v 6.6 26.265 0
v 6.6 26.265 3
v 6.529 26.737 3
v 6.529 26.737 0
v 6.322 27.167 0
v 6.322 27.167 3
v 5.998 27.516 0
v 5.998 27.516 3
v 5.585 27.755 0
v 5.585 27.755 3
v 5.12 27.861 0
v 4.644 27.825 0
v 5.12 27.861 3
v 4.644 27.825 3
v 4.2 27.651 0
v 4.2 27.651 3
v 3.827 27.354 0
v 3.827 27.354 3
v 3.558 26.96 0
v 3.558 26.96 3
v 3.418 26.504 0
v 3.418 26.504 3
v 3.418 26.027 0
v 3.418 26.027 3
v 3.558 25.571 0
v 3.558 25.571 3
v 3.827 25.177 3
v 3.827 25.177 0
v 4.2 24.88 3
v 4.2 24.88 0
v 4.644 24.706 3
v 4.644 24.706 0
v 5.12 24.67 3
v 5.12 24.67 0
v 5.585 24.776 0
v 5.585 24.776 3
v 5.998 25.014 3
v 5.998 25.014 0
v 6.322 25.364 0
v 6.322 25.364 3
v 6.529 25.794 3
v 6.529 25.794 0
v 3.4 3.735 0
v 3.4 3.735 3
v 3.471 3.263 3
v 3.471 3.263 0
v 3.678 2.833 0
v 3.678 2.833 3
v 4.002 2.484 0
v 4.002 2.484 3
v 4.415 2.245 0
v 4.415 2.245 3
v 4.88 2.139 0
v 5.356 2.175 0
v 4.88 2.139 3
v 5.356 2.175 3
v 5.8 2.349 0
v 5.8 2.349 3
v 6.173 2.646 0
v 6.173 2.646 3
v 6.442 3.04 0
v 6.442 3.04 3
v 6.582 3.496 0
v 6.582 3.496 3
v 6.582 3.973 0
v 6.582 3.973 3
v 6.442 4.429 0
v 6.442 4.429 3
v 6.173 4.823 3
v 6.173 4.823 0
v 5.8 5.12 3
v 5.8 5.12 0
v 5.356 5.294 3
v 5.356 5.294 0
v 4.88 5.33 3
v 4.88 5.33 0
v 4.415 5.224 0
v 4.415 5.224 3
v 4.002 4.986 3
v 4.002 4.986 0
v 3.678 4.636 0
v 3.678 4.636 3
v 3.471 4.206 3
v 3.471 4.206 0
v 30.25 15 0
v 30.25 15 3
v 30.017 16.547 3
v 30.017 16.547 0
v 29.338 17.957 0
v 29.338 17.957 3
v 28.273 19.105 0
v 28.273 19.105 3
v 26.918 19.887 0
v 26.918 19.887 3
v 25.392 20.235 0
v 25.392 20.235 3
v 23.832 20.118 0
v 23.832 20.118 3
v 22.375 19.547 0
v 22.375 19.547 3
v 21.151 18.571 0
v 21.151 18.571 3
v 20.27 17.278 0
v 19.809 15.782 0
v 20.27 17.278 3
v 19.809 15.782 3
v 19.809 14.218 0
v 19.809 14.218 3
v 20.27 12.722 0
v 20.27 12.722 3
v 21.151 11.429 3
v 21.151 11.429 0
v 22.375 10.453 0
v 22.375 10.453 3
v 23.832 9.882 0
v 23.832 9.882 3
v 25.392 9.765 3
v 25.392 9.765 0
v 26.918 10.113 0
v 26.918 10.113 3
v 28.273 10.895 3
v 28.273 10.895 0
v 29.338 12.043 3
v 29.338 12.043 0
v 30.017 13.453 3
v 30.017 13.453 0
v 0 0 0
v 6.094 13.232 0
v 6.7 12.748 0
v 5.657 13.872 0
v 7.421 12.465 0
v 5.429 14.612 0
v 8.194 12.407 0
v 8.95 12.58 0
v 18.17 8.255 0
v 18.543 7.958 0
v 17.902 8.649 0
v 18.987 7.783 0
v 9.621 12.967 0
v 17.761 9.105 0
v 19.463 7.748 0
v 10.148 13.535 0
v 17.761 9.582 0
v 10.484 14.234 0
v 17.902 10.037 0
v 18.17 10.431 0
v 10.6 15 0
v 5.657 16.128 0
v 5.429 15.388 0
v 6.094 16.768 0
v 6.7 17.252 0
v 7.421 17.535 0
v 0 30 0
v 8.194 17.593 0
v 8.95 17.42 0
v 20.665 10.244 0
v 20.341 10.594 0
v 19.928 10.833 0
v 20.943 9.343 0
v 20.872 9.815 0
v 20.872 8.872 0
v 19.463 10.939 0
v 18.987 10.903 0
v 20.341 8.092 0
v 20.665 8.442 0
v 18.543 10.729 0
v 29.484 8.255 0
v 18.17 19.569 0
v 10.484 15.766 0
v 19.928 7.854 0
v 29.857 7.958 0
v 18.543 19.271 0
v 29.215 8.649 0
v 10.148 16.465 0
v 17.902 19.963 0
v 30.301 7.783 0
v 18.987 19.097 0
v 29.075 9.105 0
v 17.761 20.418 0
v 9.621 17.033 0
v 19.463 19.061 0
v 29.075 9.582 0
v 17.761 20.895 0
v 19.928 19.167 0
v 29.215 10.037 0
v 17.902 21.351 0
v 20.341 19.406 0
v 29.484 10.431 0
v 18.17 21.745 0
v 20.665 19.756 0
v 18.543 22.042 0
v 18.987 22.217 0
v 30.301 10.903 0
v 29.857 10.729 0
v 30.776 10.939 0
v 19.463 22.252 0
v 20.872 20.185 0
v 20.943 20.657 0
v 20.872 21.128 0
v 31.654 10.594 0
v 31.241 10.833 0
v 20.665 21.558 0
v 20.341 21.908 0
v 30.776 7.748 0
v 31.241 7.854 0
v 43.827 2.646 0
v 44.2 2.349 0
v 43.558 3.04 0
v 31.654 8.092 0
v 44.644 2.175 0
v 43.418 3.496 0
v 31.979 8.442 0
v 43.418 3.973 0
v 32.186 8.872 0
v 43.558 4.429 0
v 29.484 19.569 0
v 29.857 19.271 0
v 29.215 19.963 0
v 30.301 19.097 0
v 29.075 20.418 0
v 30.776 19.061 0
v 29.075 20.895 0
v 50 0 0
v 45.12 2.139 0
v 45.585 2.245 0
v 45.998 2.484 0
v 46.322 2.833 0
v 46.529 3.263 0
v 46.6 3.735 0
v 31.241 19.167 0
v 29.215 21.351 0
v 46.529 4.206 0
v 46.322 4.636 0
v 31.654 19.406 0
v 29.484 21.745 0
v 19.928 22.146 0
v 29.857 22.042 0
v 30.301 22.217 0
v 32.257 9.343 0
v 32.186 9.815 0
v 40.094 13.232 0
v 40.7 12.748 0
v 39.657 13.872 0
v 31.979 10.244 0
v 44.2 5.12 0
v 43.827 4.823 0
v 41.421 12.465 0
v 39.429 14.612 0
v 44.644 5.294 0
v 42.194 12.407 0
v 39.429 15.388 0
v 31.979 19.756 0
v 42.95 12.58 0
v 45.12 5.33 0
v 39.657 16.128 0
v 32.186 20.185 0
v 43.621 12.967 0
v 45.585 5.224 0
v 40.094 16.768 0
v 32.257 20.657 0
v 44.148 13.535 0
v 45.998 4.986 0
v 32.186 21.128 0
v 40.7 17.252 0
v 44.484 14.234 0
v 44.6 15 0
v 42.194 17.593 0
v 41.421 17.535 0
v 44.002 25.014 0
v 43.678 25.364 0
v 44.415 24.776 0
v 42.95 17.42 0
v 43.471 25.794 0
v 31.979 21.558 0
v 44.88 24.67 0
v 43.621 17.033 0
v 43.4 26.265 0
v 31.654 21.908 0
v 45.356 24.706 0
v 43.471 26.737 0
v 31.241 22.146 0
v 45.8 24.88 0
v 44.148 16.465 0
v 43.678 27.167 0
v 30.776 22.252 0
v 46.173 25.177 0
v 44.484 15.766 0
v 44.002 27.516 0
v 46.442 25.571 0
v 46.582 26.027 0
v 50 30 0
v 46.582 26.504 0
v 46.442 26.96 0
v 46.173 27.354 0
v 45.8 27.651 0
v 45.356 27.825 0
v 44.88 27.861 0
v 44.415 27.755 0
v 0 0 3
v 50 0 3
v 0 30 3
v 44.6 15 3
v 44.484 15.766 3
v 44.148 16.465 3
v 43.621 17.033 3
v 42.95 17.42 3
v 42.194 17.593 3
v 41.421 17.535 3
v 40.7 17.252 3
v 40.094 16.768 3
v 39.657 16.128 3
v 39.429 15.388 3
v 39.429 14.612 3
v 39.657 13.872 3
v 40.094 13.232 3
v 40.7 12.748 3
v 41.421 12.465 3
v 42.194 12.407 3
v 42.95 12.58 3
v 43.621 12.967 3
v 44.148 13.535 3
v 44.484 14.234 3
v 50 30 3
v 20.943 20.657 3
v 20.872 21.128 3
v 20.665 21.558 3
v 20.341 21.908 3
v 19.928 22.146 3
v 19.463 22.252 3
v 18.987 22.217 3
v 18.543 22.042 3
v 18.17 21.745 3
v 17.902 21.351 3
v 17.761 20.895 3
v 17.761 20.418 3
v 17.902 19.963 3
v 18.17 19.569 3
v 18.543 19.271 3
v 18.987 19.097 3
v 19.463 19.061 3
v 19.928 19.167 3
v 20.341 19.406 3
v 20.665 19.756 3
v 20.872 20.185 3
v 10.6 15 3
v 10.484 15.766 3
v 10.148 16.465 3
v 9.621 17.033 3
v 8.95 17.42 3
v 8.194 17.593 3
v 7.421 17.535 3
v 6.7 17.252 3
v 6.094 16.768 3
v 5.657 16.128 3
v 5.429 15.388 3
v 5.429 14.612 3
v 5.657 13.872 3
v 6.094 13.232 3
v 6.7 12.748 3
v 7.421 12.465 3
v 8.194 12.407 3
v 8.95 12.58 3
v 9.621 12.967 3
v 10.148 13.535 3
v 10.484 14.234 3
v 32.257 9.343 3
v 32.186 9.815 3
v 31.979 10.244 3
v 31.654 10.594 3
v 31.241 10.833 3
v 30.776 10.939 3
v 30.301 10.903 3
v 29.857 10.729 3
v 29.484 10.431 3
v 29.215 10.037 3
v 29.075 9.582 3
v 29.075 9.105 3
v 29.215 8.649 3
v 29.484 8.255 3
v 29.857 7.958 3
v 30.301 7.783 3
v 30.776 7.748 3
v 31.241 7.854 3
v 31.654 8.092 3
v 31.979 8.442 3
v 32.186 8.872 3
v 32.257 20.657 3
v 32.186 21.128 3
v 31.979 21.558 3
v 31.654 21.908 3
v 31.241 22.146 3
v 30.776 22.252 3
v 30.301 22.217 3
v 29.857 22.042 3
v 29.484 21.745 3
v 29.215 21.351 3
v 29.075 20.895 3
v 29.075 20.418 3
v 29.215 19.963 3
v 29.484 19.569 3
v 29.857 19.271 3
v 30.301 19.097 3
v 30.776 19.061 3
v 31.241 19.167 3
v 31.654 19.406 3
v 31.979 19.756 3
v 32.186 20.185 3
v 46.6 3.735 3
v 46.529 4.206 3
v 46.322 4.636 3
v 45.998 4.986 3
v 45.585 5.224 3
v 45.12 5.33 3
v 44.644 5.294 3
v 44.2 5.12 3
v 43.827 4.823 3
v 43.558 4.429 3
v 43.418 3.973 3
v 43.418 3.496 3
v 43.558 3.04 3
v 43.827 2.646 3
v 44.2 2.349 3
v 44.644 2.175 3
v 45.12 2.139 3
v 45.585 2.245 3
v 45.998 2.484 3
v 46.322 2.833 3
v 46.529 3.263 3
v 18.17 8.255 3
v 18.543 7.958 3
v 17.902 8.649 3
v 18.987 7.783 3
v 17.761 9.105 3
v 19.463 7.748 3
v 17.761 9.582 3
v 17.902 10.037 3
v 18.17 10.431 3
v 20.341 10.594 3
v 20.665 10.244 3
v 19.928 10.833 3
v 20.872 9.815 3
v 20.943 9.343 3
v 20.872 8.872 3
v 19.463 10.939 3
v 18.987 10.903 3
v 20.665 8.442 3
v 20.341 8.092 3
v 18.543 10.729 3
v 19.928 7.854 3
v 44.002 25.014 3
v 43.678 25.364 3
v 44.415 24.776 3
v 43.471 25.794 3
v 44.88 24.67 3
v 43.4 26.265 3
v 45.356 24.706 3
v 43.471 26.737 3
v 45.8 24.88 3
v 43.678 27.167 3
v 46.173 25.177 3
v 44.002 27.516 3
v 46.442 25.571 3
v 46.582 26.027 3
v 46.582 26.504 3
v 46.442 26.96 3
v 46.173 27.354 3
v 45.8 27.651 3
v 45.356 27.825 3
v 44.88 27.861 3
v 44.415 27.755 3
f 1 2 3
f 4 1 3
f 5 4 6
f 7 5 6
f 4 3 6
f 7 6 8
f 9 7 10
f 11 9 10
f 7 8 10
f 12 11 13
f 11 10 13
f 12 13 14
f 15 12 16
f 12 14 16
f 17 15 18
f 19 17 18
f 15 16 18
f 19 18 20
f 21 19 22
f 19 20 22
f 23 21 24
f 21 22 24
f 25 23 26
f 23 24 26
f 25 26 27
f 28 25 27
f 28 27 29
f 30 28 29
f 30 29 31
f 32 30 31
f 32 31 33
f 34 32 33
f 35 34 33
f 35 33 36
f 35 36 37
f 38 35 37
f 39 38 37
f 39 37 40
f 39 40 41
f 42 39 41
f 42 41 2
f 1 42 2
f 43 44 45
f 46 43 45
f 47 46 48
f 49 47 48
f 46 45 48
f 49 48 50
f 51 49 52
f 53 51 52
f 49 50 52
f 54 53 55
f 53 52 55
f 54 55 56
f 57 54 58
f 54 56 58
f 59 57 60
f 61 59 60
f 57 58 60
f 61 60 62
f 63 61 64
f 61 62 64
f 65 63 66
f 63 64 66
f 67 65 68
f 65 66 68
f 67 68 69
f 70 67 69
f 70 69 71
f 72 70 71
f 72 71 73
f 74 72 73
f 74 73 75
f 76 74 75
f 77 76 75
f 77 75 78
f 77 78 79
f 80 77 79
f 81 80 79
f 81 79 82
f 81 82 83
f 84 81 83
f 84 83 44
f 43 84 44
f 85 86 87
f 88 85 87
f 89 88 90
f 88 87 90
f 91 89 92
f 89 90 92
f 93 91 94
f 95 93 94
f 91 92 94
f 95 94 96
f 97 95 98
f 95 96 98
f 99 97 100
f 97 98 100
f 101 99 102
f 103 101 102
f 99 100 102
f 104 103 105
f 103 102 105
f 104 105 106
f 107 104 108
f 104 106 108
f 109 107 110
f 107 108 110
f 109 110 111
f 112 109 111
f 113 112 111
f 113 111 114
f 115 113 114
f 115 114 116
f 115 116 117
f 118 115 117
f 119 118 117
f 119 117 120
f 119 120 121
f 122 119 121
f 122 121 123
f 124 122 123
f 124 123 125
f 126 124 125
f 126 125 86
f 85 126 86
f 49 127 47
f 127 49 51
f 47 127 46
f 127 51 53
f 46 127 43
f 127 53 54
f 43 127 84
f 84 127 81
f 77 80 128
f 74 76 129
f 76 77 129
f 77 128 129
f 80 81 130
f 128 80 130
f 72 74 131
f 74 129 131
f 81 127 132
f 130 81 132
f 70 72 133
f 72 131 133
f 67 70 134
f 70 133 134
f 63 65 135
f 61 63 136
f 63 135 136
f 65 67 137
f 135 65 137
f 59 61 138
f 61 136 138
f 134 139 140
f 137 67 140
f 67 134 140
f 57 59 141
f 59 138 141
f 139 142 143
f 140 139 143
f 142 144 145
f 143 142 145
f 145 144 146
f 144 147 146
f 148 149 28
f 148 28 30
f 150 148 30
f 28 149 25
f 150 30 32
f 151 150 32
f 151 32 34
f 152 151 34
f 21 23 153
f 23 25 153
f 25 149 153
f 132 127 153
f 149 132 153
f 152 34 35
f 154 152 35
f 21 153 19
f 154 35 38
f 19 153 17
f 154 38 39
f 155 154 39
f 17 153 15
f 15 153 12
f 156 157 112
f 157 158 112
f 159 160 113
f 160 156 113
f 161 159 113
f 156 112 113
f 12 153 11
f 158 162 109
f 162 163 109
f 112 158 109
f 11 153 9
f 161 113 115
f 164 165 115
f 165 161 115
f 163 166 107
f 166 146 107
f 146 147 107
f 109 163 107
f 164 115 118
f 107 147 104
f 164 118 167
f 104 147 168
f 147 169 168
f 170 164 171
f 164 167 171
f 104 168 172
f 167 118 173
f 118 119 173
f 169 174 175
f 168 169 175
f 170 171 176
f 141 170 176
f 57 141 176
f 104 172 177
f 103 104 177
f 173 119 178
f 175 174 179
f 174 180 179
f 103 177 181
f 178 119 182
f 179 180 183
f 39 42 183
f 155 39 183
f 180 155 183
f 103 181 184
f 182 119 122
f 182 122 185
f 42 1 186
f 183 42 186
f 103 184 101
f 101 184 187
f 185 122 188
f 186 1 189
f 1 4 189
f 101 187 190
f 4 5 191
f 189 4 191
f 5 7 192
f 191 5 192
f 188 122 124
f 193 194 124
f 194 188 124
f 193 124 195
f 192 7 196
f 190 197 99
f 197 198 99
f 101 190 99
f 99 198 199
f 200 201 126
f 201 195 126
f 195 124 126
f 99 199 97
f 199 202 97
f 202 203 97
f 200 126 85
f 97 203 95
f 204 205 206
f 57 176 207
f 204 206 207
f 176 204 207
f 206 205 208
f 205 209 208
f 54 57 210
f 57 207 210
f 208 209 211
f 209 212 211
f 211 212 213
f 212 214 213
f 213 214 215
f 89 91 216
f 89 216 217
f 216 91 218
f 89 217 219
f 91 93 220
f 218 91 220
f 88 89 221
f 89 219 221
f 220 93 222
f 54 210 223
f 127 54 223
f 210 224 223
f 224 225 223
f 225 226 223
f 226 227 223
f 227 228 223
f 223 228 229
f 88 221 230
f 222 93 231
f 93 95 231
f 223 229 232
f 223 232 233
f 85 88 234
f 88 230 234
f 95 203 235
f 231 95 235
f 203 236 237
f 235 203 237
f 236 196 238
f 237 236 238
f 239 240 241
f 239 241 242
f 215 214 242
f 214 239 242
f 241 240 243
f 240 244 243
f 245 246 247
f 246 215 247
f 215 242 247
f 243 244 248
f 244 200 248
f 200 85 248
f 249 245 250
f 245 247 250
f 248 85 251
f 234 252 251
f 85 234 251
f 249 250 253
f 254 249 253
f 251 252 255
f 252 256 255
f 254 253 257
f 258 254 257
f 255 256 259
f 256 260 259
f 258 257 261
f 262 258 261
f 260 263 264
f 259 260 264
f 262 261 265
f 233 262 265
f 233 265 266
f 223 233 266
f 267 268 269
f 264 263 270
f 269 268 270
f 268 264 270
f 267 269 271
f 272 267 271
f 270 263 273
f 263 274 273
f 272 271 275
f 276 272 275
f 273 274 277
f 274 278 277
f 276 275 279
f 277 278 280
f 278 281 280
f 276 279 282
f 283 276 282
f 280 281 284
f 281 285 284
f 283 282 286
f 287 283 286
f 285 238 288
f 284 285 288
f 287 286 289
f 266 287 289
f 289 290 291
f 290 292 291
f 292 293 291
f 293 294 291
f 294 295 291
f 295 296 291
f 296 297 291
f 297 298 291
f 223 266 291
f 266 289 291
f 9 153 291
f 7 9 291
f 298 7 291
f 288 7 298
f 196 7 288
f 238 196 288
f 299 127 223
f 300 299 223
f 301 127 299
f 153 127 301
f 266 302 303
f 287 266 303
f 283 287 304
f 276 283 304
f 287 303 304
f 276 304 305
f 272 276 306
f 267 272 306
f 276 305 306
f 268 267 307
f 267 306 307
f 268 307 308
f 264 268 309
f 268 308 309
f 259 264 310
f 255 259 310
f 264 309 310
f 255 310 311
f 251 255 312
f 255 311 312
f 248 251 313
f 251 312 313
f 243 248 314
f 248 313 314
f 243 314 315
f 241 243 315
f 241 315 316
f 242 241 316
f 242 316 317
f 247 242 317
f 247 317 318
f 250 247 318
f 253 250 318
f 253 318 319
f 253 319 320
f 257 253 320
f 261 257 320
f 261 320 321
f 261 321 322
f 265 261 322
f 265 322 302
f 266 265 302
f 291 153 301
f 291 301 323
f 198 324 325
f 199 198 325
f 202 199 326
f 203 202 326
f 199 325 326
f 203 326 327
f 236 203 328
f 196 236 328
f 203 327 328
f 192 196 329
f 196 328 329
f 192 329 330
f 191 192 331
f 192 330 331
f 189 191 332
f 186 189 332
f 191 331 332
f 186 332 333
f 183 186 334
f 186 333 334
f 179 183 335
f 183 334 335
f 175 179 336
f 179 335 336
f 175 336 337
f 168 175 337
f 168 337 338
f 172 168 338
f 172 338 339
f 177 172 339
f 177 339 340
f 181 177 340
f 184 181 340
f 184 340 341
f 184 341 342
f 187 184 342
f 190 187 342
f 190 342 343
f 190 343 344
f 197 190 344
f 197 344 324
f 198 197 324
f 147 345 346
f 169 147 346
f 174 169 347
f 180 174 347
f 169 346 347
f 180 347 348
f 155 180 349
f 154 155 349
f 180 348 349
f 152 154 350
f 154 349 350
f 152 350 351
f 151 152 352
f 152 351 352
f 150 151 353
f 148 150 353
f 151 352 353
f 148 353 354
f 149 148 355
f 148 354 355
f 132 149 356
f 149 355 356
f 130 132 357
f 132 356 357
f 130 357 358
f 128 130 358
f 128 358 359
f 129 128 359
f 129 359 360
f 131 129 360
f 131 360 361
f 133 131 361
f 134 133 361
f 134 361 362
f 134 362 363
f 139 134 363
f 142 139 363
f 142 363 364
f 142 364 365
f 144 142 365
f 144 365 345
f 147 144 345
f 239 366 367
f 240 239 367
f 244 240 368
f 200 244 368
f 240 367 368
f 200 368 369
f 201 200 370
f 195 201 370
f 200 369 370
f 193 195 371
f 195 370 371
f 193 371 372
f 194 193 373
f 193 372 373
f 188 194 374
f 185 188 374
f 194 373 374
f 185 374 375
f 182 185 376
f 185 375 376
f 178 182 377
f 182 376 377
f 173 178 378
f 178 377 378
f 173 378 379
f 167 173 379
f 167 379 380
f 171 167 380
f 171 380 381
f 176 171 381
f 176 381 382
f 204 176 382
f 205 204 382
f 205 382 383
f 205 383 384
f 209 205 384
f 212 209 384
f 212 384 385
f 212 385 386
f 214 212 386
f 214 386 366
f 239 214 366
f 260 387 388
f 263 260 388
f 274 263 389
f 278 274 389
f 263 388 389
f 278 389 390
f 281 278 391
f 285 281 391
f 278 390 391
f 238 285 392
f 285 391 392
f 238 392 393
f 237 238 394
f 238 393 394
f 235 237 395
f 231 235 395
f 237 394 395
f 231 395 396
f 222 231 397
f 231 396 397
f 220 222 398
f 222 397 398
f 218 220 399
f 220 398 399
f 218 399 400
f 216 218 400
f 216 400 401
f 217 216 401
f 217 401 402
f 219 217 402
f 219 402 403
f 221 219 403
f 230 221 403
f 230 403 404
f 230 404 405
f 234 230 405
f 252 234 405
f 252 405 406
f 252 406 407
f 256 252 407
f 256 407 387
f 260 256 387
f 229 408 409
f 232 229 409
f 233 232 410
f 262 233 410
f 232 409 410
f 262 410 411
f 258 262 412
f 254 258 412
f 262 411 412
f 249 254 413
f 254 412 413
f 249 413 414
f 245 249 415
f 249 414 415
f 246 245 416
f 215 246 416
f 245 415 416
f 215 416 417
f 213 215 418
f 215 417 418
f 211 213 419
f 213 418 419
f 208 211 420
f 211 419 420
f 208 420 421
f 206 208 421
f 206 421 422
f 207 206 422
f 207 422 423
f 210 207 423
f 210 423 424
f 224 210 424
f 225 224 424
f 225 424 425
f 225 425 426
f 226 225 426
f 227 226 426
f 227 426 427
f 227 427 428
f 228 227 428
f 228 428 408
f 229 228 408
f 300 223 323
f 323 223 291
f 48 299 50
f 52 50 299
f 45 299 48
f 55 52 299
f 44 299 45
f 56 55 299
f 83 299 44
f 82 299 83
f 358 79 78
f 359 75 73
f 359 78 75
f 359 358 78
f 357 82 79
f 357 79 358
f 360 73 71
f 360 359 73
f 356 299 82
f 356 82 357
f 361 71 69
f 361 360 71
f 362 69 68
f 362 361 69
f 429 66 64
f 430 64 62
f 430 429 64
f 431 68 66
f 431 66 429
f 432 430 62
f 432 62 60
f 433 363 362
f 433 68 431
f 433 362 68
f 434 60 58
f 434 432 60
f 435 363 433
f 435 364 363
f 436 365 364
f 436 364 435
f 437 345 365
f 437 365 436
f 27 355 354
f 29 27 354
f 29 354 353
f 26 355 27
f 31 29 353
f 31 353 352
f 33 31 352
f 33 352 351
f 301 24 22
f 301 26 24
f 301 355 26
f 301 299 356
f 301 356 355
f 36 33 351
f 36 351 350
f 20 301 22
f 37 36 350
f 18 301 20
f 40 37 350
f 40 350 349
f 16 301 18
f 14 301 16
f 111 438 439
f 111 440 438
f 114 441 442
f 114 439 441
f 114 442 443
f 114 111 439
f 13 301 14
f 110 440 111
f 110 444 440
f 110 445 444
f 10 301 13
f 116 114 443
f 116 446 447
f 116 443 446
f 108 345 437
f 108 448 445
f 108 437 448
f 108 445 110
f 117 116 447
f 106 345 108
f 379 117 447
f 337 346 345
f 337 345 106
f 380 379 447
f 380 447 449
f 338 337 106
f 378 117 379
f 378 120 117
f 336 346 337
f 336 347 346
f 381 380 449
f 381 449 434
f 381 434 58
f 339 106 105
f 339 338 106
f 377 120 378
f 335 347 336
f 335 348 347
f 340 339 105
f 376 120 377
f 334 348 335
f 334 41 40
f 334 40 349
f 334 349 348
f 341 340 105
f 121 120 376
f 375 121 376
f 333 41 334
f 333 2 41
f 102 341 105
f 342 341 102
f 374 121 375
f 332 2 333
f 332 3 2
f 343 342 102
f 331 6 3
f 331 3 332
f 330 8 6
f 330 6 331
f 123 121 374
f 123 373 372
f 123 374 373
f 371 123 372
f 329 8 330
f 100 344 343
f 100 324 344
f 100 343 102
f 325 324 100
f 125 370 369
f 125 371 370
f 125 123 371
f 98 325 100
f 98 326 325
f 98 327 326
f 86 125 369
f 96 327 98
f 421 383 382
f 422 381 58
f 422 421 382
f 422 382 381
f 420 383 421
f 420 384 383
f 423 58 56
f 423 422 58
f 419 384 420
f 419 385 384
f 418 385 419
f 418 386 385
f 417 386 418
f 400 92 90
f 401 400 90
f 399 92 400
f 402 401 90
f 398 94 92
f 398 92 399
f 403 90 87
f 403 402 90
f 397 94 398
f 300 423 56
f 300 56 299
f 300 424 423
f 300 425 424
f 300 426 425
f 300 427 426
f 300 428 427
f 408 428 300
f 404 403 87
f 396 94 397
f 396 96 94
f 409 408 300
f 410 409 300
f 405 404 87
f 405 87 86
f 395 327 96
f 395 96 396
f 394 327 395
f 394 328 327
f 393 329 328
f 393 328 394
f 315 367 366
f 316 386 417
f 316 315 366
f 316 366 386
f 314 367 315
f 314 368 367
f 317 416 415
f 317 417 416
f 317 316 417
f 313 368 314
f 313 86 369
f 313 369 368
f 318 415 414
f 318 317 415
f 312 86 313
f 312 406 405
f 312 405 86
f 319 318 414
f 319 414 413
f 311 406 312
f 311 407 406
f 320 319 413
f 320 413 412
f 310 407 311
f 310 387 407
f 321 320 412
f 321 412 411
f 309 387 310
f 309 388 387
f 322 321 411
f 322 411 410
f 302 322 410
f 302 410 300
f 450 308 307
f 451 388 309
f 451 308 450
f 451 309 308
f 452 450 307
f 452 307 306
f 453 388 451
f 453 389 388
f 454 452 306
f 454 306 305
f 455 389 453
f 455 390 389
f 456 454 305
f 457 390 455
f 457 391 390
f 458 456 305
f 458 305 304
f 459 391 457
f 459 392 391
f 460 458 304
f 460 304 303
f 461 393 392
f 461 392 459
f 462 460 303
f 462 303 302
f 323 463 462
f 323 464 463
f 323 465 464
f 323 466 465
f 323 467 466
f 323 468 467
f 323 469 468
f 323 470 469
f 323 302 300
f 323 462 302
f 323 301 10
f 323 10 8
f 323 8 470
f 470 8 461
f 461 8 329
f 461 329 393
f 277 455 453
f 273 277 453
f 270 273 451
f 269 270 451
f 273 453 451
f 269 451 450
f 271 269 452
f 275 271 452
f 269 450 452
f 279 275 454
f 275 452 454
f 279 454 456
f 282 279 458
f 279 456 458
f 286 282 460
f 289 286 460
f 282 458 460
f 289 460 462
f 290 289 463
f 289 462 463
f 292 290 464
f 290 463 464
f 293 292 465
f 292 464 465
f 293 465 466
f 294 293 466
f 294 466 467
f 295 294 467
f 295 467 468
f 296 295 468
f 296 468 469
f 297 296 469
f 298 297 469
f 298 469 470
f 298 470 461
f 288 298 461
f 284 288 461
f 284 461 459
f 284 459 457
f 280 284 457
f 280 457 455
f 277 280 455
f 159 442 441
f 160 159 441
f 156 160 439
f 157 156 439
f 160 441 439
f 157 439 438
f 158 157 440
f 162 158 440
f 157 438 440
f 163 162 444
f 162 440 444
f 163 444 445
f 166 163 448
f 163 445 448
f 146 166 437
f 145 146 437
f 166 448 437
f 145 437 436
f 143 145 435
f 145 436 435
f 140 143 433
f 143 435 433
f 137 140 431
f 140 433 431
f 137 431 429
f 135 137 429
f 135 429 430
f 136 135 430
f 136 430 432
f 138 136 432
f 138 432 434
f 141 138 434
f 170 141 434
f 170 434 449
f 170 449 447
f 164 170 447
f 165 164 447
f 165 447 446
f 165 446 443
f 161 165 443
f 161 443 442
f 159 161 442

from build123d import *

# Parameters (mm, degrees)
SKETCH_1_W          = 50
SKETCH_1_H          = 30
EXTRUDE_1_DEPTH     = 3
SKETCH_2_R          = 2.6
SKETCH_2_R_2        = 1.6
SKETCH_2_R_3        = 5.25
CUT_EXTRUDE_1_DEPTH = 5


with BuildPart() as part:
    # 草图1 → 凸台-拉伸1 (new body)
    with BuildSketch(Plane.XY):
        with Locations((25, 15)):
            Rectangle(SKETCH_1_W, SKETCH_1_H)
    extrude(amount=EXTRUDE_1_DEPTH)

    # 草图2 → 切除-拉伸1 (cut)
    with BuildSketch(Plane.XY.offset(3)):
        with Locations((8, 15)):
            Circle(SKETCH_2_R)
        with Locations((42, 15)):
            Circle(SKETCH_2_R)
        with Locations((30.656854249, 20.656854249)):
            Circle(SKETCH_2_R_2)
        with Locations((30.656854249, 9.343145751)):
            Circle(SKETCH_2_R_2)
        with Locations((19.343145751, 9.343145751)):
            Circle(SKETCH_2_R_2)
        with Locations((19.343145751, 20.656854249)):
            Circle(SKETCH_2_R_2)
        with Locations((25, 15)):
            Circle(SKETCH_2_R_3)
        with Locations((45, 3.734603705)):
            Circle(SKETCH_2_R_2)
        with Locations(Location((45, 26.265396295, 0), (0, 0, 180))):
            Circle(SKETCH_2_R_2)
        with Locations((5, 26.265396295)):
            Circle(SKETCH_2_R_2)
        with Locations(Location((5, 3.734603705, 0), (0, 0, 180))):
            Circle(SKETCH_2_R_2)
    extrude(amount=-CUT_EXTRUDE_1_DEPTH, mode=Mode.SUBTRACT)


solid = part.part
